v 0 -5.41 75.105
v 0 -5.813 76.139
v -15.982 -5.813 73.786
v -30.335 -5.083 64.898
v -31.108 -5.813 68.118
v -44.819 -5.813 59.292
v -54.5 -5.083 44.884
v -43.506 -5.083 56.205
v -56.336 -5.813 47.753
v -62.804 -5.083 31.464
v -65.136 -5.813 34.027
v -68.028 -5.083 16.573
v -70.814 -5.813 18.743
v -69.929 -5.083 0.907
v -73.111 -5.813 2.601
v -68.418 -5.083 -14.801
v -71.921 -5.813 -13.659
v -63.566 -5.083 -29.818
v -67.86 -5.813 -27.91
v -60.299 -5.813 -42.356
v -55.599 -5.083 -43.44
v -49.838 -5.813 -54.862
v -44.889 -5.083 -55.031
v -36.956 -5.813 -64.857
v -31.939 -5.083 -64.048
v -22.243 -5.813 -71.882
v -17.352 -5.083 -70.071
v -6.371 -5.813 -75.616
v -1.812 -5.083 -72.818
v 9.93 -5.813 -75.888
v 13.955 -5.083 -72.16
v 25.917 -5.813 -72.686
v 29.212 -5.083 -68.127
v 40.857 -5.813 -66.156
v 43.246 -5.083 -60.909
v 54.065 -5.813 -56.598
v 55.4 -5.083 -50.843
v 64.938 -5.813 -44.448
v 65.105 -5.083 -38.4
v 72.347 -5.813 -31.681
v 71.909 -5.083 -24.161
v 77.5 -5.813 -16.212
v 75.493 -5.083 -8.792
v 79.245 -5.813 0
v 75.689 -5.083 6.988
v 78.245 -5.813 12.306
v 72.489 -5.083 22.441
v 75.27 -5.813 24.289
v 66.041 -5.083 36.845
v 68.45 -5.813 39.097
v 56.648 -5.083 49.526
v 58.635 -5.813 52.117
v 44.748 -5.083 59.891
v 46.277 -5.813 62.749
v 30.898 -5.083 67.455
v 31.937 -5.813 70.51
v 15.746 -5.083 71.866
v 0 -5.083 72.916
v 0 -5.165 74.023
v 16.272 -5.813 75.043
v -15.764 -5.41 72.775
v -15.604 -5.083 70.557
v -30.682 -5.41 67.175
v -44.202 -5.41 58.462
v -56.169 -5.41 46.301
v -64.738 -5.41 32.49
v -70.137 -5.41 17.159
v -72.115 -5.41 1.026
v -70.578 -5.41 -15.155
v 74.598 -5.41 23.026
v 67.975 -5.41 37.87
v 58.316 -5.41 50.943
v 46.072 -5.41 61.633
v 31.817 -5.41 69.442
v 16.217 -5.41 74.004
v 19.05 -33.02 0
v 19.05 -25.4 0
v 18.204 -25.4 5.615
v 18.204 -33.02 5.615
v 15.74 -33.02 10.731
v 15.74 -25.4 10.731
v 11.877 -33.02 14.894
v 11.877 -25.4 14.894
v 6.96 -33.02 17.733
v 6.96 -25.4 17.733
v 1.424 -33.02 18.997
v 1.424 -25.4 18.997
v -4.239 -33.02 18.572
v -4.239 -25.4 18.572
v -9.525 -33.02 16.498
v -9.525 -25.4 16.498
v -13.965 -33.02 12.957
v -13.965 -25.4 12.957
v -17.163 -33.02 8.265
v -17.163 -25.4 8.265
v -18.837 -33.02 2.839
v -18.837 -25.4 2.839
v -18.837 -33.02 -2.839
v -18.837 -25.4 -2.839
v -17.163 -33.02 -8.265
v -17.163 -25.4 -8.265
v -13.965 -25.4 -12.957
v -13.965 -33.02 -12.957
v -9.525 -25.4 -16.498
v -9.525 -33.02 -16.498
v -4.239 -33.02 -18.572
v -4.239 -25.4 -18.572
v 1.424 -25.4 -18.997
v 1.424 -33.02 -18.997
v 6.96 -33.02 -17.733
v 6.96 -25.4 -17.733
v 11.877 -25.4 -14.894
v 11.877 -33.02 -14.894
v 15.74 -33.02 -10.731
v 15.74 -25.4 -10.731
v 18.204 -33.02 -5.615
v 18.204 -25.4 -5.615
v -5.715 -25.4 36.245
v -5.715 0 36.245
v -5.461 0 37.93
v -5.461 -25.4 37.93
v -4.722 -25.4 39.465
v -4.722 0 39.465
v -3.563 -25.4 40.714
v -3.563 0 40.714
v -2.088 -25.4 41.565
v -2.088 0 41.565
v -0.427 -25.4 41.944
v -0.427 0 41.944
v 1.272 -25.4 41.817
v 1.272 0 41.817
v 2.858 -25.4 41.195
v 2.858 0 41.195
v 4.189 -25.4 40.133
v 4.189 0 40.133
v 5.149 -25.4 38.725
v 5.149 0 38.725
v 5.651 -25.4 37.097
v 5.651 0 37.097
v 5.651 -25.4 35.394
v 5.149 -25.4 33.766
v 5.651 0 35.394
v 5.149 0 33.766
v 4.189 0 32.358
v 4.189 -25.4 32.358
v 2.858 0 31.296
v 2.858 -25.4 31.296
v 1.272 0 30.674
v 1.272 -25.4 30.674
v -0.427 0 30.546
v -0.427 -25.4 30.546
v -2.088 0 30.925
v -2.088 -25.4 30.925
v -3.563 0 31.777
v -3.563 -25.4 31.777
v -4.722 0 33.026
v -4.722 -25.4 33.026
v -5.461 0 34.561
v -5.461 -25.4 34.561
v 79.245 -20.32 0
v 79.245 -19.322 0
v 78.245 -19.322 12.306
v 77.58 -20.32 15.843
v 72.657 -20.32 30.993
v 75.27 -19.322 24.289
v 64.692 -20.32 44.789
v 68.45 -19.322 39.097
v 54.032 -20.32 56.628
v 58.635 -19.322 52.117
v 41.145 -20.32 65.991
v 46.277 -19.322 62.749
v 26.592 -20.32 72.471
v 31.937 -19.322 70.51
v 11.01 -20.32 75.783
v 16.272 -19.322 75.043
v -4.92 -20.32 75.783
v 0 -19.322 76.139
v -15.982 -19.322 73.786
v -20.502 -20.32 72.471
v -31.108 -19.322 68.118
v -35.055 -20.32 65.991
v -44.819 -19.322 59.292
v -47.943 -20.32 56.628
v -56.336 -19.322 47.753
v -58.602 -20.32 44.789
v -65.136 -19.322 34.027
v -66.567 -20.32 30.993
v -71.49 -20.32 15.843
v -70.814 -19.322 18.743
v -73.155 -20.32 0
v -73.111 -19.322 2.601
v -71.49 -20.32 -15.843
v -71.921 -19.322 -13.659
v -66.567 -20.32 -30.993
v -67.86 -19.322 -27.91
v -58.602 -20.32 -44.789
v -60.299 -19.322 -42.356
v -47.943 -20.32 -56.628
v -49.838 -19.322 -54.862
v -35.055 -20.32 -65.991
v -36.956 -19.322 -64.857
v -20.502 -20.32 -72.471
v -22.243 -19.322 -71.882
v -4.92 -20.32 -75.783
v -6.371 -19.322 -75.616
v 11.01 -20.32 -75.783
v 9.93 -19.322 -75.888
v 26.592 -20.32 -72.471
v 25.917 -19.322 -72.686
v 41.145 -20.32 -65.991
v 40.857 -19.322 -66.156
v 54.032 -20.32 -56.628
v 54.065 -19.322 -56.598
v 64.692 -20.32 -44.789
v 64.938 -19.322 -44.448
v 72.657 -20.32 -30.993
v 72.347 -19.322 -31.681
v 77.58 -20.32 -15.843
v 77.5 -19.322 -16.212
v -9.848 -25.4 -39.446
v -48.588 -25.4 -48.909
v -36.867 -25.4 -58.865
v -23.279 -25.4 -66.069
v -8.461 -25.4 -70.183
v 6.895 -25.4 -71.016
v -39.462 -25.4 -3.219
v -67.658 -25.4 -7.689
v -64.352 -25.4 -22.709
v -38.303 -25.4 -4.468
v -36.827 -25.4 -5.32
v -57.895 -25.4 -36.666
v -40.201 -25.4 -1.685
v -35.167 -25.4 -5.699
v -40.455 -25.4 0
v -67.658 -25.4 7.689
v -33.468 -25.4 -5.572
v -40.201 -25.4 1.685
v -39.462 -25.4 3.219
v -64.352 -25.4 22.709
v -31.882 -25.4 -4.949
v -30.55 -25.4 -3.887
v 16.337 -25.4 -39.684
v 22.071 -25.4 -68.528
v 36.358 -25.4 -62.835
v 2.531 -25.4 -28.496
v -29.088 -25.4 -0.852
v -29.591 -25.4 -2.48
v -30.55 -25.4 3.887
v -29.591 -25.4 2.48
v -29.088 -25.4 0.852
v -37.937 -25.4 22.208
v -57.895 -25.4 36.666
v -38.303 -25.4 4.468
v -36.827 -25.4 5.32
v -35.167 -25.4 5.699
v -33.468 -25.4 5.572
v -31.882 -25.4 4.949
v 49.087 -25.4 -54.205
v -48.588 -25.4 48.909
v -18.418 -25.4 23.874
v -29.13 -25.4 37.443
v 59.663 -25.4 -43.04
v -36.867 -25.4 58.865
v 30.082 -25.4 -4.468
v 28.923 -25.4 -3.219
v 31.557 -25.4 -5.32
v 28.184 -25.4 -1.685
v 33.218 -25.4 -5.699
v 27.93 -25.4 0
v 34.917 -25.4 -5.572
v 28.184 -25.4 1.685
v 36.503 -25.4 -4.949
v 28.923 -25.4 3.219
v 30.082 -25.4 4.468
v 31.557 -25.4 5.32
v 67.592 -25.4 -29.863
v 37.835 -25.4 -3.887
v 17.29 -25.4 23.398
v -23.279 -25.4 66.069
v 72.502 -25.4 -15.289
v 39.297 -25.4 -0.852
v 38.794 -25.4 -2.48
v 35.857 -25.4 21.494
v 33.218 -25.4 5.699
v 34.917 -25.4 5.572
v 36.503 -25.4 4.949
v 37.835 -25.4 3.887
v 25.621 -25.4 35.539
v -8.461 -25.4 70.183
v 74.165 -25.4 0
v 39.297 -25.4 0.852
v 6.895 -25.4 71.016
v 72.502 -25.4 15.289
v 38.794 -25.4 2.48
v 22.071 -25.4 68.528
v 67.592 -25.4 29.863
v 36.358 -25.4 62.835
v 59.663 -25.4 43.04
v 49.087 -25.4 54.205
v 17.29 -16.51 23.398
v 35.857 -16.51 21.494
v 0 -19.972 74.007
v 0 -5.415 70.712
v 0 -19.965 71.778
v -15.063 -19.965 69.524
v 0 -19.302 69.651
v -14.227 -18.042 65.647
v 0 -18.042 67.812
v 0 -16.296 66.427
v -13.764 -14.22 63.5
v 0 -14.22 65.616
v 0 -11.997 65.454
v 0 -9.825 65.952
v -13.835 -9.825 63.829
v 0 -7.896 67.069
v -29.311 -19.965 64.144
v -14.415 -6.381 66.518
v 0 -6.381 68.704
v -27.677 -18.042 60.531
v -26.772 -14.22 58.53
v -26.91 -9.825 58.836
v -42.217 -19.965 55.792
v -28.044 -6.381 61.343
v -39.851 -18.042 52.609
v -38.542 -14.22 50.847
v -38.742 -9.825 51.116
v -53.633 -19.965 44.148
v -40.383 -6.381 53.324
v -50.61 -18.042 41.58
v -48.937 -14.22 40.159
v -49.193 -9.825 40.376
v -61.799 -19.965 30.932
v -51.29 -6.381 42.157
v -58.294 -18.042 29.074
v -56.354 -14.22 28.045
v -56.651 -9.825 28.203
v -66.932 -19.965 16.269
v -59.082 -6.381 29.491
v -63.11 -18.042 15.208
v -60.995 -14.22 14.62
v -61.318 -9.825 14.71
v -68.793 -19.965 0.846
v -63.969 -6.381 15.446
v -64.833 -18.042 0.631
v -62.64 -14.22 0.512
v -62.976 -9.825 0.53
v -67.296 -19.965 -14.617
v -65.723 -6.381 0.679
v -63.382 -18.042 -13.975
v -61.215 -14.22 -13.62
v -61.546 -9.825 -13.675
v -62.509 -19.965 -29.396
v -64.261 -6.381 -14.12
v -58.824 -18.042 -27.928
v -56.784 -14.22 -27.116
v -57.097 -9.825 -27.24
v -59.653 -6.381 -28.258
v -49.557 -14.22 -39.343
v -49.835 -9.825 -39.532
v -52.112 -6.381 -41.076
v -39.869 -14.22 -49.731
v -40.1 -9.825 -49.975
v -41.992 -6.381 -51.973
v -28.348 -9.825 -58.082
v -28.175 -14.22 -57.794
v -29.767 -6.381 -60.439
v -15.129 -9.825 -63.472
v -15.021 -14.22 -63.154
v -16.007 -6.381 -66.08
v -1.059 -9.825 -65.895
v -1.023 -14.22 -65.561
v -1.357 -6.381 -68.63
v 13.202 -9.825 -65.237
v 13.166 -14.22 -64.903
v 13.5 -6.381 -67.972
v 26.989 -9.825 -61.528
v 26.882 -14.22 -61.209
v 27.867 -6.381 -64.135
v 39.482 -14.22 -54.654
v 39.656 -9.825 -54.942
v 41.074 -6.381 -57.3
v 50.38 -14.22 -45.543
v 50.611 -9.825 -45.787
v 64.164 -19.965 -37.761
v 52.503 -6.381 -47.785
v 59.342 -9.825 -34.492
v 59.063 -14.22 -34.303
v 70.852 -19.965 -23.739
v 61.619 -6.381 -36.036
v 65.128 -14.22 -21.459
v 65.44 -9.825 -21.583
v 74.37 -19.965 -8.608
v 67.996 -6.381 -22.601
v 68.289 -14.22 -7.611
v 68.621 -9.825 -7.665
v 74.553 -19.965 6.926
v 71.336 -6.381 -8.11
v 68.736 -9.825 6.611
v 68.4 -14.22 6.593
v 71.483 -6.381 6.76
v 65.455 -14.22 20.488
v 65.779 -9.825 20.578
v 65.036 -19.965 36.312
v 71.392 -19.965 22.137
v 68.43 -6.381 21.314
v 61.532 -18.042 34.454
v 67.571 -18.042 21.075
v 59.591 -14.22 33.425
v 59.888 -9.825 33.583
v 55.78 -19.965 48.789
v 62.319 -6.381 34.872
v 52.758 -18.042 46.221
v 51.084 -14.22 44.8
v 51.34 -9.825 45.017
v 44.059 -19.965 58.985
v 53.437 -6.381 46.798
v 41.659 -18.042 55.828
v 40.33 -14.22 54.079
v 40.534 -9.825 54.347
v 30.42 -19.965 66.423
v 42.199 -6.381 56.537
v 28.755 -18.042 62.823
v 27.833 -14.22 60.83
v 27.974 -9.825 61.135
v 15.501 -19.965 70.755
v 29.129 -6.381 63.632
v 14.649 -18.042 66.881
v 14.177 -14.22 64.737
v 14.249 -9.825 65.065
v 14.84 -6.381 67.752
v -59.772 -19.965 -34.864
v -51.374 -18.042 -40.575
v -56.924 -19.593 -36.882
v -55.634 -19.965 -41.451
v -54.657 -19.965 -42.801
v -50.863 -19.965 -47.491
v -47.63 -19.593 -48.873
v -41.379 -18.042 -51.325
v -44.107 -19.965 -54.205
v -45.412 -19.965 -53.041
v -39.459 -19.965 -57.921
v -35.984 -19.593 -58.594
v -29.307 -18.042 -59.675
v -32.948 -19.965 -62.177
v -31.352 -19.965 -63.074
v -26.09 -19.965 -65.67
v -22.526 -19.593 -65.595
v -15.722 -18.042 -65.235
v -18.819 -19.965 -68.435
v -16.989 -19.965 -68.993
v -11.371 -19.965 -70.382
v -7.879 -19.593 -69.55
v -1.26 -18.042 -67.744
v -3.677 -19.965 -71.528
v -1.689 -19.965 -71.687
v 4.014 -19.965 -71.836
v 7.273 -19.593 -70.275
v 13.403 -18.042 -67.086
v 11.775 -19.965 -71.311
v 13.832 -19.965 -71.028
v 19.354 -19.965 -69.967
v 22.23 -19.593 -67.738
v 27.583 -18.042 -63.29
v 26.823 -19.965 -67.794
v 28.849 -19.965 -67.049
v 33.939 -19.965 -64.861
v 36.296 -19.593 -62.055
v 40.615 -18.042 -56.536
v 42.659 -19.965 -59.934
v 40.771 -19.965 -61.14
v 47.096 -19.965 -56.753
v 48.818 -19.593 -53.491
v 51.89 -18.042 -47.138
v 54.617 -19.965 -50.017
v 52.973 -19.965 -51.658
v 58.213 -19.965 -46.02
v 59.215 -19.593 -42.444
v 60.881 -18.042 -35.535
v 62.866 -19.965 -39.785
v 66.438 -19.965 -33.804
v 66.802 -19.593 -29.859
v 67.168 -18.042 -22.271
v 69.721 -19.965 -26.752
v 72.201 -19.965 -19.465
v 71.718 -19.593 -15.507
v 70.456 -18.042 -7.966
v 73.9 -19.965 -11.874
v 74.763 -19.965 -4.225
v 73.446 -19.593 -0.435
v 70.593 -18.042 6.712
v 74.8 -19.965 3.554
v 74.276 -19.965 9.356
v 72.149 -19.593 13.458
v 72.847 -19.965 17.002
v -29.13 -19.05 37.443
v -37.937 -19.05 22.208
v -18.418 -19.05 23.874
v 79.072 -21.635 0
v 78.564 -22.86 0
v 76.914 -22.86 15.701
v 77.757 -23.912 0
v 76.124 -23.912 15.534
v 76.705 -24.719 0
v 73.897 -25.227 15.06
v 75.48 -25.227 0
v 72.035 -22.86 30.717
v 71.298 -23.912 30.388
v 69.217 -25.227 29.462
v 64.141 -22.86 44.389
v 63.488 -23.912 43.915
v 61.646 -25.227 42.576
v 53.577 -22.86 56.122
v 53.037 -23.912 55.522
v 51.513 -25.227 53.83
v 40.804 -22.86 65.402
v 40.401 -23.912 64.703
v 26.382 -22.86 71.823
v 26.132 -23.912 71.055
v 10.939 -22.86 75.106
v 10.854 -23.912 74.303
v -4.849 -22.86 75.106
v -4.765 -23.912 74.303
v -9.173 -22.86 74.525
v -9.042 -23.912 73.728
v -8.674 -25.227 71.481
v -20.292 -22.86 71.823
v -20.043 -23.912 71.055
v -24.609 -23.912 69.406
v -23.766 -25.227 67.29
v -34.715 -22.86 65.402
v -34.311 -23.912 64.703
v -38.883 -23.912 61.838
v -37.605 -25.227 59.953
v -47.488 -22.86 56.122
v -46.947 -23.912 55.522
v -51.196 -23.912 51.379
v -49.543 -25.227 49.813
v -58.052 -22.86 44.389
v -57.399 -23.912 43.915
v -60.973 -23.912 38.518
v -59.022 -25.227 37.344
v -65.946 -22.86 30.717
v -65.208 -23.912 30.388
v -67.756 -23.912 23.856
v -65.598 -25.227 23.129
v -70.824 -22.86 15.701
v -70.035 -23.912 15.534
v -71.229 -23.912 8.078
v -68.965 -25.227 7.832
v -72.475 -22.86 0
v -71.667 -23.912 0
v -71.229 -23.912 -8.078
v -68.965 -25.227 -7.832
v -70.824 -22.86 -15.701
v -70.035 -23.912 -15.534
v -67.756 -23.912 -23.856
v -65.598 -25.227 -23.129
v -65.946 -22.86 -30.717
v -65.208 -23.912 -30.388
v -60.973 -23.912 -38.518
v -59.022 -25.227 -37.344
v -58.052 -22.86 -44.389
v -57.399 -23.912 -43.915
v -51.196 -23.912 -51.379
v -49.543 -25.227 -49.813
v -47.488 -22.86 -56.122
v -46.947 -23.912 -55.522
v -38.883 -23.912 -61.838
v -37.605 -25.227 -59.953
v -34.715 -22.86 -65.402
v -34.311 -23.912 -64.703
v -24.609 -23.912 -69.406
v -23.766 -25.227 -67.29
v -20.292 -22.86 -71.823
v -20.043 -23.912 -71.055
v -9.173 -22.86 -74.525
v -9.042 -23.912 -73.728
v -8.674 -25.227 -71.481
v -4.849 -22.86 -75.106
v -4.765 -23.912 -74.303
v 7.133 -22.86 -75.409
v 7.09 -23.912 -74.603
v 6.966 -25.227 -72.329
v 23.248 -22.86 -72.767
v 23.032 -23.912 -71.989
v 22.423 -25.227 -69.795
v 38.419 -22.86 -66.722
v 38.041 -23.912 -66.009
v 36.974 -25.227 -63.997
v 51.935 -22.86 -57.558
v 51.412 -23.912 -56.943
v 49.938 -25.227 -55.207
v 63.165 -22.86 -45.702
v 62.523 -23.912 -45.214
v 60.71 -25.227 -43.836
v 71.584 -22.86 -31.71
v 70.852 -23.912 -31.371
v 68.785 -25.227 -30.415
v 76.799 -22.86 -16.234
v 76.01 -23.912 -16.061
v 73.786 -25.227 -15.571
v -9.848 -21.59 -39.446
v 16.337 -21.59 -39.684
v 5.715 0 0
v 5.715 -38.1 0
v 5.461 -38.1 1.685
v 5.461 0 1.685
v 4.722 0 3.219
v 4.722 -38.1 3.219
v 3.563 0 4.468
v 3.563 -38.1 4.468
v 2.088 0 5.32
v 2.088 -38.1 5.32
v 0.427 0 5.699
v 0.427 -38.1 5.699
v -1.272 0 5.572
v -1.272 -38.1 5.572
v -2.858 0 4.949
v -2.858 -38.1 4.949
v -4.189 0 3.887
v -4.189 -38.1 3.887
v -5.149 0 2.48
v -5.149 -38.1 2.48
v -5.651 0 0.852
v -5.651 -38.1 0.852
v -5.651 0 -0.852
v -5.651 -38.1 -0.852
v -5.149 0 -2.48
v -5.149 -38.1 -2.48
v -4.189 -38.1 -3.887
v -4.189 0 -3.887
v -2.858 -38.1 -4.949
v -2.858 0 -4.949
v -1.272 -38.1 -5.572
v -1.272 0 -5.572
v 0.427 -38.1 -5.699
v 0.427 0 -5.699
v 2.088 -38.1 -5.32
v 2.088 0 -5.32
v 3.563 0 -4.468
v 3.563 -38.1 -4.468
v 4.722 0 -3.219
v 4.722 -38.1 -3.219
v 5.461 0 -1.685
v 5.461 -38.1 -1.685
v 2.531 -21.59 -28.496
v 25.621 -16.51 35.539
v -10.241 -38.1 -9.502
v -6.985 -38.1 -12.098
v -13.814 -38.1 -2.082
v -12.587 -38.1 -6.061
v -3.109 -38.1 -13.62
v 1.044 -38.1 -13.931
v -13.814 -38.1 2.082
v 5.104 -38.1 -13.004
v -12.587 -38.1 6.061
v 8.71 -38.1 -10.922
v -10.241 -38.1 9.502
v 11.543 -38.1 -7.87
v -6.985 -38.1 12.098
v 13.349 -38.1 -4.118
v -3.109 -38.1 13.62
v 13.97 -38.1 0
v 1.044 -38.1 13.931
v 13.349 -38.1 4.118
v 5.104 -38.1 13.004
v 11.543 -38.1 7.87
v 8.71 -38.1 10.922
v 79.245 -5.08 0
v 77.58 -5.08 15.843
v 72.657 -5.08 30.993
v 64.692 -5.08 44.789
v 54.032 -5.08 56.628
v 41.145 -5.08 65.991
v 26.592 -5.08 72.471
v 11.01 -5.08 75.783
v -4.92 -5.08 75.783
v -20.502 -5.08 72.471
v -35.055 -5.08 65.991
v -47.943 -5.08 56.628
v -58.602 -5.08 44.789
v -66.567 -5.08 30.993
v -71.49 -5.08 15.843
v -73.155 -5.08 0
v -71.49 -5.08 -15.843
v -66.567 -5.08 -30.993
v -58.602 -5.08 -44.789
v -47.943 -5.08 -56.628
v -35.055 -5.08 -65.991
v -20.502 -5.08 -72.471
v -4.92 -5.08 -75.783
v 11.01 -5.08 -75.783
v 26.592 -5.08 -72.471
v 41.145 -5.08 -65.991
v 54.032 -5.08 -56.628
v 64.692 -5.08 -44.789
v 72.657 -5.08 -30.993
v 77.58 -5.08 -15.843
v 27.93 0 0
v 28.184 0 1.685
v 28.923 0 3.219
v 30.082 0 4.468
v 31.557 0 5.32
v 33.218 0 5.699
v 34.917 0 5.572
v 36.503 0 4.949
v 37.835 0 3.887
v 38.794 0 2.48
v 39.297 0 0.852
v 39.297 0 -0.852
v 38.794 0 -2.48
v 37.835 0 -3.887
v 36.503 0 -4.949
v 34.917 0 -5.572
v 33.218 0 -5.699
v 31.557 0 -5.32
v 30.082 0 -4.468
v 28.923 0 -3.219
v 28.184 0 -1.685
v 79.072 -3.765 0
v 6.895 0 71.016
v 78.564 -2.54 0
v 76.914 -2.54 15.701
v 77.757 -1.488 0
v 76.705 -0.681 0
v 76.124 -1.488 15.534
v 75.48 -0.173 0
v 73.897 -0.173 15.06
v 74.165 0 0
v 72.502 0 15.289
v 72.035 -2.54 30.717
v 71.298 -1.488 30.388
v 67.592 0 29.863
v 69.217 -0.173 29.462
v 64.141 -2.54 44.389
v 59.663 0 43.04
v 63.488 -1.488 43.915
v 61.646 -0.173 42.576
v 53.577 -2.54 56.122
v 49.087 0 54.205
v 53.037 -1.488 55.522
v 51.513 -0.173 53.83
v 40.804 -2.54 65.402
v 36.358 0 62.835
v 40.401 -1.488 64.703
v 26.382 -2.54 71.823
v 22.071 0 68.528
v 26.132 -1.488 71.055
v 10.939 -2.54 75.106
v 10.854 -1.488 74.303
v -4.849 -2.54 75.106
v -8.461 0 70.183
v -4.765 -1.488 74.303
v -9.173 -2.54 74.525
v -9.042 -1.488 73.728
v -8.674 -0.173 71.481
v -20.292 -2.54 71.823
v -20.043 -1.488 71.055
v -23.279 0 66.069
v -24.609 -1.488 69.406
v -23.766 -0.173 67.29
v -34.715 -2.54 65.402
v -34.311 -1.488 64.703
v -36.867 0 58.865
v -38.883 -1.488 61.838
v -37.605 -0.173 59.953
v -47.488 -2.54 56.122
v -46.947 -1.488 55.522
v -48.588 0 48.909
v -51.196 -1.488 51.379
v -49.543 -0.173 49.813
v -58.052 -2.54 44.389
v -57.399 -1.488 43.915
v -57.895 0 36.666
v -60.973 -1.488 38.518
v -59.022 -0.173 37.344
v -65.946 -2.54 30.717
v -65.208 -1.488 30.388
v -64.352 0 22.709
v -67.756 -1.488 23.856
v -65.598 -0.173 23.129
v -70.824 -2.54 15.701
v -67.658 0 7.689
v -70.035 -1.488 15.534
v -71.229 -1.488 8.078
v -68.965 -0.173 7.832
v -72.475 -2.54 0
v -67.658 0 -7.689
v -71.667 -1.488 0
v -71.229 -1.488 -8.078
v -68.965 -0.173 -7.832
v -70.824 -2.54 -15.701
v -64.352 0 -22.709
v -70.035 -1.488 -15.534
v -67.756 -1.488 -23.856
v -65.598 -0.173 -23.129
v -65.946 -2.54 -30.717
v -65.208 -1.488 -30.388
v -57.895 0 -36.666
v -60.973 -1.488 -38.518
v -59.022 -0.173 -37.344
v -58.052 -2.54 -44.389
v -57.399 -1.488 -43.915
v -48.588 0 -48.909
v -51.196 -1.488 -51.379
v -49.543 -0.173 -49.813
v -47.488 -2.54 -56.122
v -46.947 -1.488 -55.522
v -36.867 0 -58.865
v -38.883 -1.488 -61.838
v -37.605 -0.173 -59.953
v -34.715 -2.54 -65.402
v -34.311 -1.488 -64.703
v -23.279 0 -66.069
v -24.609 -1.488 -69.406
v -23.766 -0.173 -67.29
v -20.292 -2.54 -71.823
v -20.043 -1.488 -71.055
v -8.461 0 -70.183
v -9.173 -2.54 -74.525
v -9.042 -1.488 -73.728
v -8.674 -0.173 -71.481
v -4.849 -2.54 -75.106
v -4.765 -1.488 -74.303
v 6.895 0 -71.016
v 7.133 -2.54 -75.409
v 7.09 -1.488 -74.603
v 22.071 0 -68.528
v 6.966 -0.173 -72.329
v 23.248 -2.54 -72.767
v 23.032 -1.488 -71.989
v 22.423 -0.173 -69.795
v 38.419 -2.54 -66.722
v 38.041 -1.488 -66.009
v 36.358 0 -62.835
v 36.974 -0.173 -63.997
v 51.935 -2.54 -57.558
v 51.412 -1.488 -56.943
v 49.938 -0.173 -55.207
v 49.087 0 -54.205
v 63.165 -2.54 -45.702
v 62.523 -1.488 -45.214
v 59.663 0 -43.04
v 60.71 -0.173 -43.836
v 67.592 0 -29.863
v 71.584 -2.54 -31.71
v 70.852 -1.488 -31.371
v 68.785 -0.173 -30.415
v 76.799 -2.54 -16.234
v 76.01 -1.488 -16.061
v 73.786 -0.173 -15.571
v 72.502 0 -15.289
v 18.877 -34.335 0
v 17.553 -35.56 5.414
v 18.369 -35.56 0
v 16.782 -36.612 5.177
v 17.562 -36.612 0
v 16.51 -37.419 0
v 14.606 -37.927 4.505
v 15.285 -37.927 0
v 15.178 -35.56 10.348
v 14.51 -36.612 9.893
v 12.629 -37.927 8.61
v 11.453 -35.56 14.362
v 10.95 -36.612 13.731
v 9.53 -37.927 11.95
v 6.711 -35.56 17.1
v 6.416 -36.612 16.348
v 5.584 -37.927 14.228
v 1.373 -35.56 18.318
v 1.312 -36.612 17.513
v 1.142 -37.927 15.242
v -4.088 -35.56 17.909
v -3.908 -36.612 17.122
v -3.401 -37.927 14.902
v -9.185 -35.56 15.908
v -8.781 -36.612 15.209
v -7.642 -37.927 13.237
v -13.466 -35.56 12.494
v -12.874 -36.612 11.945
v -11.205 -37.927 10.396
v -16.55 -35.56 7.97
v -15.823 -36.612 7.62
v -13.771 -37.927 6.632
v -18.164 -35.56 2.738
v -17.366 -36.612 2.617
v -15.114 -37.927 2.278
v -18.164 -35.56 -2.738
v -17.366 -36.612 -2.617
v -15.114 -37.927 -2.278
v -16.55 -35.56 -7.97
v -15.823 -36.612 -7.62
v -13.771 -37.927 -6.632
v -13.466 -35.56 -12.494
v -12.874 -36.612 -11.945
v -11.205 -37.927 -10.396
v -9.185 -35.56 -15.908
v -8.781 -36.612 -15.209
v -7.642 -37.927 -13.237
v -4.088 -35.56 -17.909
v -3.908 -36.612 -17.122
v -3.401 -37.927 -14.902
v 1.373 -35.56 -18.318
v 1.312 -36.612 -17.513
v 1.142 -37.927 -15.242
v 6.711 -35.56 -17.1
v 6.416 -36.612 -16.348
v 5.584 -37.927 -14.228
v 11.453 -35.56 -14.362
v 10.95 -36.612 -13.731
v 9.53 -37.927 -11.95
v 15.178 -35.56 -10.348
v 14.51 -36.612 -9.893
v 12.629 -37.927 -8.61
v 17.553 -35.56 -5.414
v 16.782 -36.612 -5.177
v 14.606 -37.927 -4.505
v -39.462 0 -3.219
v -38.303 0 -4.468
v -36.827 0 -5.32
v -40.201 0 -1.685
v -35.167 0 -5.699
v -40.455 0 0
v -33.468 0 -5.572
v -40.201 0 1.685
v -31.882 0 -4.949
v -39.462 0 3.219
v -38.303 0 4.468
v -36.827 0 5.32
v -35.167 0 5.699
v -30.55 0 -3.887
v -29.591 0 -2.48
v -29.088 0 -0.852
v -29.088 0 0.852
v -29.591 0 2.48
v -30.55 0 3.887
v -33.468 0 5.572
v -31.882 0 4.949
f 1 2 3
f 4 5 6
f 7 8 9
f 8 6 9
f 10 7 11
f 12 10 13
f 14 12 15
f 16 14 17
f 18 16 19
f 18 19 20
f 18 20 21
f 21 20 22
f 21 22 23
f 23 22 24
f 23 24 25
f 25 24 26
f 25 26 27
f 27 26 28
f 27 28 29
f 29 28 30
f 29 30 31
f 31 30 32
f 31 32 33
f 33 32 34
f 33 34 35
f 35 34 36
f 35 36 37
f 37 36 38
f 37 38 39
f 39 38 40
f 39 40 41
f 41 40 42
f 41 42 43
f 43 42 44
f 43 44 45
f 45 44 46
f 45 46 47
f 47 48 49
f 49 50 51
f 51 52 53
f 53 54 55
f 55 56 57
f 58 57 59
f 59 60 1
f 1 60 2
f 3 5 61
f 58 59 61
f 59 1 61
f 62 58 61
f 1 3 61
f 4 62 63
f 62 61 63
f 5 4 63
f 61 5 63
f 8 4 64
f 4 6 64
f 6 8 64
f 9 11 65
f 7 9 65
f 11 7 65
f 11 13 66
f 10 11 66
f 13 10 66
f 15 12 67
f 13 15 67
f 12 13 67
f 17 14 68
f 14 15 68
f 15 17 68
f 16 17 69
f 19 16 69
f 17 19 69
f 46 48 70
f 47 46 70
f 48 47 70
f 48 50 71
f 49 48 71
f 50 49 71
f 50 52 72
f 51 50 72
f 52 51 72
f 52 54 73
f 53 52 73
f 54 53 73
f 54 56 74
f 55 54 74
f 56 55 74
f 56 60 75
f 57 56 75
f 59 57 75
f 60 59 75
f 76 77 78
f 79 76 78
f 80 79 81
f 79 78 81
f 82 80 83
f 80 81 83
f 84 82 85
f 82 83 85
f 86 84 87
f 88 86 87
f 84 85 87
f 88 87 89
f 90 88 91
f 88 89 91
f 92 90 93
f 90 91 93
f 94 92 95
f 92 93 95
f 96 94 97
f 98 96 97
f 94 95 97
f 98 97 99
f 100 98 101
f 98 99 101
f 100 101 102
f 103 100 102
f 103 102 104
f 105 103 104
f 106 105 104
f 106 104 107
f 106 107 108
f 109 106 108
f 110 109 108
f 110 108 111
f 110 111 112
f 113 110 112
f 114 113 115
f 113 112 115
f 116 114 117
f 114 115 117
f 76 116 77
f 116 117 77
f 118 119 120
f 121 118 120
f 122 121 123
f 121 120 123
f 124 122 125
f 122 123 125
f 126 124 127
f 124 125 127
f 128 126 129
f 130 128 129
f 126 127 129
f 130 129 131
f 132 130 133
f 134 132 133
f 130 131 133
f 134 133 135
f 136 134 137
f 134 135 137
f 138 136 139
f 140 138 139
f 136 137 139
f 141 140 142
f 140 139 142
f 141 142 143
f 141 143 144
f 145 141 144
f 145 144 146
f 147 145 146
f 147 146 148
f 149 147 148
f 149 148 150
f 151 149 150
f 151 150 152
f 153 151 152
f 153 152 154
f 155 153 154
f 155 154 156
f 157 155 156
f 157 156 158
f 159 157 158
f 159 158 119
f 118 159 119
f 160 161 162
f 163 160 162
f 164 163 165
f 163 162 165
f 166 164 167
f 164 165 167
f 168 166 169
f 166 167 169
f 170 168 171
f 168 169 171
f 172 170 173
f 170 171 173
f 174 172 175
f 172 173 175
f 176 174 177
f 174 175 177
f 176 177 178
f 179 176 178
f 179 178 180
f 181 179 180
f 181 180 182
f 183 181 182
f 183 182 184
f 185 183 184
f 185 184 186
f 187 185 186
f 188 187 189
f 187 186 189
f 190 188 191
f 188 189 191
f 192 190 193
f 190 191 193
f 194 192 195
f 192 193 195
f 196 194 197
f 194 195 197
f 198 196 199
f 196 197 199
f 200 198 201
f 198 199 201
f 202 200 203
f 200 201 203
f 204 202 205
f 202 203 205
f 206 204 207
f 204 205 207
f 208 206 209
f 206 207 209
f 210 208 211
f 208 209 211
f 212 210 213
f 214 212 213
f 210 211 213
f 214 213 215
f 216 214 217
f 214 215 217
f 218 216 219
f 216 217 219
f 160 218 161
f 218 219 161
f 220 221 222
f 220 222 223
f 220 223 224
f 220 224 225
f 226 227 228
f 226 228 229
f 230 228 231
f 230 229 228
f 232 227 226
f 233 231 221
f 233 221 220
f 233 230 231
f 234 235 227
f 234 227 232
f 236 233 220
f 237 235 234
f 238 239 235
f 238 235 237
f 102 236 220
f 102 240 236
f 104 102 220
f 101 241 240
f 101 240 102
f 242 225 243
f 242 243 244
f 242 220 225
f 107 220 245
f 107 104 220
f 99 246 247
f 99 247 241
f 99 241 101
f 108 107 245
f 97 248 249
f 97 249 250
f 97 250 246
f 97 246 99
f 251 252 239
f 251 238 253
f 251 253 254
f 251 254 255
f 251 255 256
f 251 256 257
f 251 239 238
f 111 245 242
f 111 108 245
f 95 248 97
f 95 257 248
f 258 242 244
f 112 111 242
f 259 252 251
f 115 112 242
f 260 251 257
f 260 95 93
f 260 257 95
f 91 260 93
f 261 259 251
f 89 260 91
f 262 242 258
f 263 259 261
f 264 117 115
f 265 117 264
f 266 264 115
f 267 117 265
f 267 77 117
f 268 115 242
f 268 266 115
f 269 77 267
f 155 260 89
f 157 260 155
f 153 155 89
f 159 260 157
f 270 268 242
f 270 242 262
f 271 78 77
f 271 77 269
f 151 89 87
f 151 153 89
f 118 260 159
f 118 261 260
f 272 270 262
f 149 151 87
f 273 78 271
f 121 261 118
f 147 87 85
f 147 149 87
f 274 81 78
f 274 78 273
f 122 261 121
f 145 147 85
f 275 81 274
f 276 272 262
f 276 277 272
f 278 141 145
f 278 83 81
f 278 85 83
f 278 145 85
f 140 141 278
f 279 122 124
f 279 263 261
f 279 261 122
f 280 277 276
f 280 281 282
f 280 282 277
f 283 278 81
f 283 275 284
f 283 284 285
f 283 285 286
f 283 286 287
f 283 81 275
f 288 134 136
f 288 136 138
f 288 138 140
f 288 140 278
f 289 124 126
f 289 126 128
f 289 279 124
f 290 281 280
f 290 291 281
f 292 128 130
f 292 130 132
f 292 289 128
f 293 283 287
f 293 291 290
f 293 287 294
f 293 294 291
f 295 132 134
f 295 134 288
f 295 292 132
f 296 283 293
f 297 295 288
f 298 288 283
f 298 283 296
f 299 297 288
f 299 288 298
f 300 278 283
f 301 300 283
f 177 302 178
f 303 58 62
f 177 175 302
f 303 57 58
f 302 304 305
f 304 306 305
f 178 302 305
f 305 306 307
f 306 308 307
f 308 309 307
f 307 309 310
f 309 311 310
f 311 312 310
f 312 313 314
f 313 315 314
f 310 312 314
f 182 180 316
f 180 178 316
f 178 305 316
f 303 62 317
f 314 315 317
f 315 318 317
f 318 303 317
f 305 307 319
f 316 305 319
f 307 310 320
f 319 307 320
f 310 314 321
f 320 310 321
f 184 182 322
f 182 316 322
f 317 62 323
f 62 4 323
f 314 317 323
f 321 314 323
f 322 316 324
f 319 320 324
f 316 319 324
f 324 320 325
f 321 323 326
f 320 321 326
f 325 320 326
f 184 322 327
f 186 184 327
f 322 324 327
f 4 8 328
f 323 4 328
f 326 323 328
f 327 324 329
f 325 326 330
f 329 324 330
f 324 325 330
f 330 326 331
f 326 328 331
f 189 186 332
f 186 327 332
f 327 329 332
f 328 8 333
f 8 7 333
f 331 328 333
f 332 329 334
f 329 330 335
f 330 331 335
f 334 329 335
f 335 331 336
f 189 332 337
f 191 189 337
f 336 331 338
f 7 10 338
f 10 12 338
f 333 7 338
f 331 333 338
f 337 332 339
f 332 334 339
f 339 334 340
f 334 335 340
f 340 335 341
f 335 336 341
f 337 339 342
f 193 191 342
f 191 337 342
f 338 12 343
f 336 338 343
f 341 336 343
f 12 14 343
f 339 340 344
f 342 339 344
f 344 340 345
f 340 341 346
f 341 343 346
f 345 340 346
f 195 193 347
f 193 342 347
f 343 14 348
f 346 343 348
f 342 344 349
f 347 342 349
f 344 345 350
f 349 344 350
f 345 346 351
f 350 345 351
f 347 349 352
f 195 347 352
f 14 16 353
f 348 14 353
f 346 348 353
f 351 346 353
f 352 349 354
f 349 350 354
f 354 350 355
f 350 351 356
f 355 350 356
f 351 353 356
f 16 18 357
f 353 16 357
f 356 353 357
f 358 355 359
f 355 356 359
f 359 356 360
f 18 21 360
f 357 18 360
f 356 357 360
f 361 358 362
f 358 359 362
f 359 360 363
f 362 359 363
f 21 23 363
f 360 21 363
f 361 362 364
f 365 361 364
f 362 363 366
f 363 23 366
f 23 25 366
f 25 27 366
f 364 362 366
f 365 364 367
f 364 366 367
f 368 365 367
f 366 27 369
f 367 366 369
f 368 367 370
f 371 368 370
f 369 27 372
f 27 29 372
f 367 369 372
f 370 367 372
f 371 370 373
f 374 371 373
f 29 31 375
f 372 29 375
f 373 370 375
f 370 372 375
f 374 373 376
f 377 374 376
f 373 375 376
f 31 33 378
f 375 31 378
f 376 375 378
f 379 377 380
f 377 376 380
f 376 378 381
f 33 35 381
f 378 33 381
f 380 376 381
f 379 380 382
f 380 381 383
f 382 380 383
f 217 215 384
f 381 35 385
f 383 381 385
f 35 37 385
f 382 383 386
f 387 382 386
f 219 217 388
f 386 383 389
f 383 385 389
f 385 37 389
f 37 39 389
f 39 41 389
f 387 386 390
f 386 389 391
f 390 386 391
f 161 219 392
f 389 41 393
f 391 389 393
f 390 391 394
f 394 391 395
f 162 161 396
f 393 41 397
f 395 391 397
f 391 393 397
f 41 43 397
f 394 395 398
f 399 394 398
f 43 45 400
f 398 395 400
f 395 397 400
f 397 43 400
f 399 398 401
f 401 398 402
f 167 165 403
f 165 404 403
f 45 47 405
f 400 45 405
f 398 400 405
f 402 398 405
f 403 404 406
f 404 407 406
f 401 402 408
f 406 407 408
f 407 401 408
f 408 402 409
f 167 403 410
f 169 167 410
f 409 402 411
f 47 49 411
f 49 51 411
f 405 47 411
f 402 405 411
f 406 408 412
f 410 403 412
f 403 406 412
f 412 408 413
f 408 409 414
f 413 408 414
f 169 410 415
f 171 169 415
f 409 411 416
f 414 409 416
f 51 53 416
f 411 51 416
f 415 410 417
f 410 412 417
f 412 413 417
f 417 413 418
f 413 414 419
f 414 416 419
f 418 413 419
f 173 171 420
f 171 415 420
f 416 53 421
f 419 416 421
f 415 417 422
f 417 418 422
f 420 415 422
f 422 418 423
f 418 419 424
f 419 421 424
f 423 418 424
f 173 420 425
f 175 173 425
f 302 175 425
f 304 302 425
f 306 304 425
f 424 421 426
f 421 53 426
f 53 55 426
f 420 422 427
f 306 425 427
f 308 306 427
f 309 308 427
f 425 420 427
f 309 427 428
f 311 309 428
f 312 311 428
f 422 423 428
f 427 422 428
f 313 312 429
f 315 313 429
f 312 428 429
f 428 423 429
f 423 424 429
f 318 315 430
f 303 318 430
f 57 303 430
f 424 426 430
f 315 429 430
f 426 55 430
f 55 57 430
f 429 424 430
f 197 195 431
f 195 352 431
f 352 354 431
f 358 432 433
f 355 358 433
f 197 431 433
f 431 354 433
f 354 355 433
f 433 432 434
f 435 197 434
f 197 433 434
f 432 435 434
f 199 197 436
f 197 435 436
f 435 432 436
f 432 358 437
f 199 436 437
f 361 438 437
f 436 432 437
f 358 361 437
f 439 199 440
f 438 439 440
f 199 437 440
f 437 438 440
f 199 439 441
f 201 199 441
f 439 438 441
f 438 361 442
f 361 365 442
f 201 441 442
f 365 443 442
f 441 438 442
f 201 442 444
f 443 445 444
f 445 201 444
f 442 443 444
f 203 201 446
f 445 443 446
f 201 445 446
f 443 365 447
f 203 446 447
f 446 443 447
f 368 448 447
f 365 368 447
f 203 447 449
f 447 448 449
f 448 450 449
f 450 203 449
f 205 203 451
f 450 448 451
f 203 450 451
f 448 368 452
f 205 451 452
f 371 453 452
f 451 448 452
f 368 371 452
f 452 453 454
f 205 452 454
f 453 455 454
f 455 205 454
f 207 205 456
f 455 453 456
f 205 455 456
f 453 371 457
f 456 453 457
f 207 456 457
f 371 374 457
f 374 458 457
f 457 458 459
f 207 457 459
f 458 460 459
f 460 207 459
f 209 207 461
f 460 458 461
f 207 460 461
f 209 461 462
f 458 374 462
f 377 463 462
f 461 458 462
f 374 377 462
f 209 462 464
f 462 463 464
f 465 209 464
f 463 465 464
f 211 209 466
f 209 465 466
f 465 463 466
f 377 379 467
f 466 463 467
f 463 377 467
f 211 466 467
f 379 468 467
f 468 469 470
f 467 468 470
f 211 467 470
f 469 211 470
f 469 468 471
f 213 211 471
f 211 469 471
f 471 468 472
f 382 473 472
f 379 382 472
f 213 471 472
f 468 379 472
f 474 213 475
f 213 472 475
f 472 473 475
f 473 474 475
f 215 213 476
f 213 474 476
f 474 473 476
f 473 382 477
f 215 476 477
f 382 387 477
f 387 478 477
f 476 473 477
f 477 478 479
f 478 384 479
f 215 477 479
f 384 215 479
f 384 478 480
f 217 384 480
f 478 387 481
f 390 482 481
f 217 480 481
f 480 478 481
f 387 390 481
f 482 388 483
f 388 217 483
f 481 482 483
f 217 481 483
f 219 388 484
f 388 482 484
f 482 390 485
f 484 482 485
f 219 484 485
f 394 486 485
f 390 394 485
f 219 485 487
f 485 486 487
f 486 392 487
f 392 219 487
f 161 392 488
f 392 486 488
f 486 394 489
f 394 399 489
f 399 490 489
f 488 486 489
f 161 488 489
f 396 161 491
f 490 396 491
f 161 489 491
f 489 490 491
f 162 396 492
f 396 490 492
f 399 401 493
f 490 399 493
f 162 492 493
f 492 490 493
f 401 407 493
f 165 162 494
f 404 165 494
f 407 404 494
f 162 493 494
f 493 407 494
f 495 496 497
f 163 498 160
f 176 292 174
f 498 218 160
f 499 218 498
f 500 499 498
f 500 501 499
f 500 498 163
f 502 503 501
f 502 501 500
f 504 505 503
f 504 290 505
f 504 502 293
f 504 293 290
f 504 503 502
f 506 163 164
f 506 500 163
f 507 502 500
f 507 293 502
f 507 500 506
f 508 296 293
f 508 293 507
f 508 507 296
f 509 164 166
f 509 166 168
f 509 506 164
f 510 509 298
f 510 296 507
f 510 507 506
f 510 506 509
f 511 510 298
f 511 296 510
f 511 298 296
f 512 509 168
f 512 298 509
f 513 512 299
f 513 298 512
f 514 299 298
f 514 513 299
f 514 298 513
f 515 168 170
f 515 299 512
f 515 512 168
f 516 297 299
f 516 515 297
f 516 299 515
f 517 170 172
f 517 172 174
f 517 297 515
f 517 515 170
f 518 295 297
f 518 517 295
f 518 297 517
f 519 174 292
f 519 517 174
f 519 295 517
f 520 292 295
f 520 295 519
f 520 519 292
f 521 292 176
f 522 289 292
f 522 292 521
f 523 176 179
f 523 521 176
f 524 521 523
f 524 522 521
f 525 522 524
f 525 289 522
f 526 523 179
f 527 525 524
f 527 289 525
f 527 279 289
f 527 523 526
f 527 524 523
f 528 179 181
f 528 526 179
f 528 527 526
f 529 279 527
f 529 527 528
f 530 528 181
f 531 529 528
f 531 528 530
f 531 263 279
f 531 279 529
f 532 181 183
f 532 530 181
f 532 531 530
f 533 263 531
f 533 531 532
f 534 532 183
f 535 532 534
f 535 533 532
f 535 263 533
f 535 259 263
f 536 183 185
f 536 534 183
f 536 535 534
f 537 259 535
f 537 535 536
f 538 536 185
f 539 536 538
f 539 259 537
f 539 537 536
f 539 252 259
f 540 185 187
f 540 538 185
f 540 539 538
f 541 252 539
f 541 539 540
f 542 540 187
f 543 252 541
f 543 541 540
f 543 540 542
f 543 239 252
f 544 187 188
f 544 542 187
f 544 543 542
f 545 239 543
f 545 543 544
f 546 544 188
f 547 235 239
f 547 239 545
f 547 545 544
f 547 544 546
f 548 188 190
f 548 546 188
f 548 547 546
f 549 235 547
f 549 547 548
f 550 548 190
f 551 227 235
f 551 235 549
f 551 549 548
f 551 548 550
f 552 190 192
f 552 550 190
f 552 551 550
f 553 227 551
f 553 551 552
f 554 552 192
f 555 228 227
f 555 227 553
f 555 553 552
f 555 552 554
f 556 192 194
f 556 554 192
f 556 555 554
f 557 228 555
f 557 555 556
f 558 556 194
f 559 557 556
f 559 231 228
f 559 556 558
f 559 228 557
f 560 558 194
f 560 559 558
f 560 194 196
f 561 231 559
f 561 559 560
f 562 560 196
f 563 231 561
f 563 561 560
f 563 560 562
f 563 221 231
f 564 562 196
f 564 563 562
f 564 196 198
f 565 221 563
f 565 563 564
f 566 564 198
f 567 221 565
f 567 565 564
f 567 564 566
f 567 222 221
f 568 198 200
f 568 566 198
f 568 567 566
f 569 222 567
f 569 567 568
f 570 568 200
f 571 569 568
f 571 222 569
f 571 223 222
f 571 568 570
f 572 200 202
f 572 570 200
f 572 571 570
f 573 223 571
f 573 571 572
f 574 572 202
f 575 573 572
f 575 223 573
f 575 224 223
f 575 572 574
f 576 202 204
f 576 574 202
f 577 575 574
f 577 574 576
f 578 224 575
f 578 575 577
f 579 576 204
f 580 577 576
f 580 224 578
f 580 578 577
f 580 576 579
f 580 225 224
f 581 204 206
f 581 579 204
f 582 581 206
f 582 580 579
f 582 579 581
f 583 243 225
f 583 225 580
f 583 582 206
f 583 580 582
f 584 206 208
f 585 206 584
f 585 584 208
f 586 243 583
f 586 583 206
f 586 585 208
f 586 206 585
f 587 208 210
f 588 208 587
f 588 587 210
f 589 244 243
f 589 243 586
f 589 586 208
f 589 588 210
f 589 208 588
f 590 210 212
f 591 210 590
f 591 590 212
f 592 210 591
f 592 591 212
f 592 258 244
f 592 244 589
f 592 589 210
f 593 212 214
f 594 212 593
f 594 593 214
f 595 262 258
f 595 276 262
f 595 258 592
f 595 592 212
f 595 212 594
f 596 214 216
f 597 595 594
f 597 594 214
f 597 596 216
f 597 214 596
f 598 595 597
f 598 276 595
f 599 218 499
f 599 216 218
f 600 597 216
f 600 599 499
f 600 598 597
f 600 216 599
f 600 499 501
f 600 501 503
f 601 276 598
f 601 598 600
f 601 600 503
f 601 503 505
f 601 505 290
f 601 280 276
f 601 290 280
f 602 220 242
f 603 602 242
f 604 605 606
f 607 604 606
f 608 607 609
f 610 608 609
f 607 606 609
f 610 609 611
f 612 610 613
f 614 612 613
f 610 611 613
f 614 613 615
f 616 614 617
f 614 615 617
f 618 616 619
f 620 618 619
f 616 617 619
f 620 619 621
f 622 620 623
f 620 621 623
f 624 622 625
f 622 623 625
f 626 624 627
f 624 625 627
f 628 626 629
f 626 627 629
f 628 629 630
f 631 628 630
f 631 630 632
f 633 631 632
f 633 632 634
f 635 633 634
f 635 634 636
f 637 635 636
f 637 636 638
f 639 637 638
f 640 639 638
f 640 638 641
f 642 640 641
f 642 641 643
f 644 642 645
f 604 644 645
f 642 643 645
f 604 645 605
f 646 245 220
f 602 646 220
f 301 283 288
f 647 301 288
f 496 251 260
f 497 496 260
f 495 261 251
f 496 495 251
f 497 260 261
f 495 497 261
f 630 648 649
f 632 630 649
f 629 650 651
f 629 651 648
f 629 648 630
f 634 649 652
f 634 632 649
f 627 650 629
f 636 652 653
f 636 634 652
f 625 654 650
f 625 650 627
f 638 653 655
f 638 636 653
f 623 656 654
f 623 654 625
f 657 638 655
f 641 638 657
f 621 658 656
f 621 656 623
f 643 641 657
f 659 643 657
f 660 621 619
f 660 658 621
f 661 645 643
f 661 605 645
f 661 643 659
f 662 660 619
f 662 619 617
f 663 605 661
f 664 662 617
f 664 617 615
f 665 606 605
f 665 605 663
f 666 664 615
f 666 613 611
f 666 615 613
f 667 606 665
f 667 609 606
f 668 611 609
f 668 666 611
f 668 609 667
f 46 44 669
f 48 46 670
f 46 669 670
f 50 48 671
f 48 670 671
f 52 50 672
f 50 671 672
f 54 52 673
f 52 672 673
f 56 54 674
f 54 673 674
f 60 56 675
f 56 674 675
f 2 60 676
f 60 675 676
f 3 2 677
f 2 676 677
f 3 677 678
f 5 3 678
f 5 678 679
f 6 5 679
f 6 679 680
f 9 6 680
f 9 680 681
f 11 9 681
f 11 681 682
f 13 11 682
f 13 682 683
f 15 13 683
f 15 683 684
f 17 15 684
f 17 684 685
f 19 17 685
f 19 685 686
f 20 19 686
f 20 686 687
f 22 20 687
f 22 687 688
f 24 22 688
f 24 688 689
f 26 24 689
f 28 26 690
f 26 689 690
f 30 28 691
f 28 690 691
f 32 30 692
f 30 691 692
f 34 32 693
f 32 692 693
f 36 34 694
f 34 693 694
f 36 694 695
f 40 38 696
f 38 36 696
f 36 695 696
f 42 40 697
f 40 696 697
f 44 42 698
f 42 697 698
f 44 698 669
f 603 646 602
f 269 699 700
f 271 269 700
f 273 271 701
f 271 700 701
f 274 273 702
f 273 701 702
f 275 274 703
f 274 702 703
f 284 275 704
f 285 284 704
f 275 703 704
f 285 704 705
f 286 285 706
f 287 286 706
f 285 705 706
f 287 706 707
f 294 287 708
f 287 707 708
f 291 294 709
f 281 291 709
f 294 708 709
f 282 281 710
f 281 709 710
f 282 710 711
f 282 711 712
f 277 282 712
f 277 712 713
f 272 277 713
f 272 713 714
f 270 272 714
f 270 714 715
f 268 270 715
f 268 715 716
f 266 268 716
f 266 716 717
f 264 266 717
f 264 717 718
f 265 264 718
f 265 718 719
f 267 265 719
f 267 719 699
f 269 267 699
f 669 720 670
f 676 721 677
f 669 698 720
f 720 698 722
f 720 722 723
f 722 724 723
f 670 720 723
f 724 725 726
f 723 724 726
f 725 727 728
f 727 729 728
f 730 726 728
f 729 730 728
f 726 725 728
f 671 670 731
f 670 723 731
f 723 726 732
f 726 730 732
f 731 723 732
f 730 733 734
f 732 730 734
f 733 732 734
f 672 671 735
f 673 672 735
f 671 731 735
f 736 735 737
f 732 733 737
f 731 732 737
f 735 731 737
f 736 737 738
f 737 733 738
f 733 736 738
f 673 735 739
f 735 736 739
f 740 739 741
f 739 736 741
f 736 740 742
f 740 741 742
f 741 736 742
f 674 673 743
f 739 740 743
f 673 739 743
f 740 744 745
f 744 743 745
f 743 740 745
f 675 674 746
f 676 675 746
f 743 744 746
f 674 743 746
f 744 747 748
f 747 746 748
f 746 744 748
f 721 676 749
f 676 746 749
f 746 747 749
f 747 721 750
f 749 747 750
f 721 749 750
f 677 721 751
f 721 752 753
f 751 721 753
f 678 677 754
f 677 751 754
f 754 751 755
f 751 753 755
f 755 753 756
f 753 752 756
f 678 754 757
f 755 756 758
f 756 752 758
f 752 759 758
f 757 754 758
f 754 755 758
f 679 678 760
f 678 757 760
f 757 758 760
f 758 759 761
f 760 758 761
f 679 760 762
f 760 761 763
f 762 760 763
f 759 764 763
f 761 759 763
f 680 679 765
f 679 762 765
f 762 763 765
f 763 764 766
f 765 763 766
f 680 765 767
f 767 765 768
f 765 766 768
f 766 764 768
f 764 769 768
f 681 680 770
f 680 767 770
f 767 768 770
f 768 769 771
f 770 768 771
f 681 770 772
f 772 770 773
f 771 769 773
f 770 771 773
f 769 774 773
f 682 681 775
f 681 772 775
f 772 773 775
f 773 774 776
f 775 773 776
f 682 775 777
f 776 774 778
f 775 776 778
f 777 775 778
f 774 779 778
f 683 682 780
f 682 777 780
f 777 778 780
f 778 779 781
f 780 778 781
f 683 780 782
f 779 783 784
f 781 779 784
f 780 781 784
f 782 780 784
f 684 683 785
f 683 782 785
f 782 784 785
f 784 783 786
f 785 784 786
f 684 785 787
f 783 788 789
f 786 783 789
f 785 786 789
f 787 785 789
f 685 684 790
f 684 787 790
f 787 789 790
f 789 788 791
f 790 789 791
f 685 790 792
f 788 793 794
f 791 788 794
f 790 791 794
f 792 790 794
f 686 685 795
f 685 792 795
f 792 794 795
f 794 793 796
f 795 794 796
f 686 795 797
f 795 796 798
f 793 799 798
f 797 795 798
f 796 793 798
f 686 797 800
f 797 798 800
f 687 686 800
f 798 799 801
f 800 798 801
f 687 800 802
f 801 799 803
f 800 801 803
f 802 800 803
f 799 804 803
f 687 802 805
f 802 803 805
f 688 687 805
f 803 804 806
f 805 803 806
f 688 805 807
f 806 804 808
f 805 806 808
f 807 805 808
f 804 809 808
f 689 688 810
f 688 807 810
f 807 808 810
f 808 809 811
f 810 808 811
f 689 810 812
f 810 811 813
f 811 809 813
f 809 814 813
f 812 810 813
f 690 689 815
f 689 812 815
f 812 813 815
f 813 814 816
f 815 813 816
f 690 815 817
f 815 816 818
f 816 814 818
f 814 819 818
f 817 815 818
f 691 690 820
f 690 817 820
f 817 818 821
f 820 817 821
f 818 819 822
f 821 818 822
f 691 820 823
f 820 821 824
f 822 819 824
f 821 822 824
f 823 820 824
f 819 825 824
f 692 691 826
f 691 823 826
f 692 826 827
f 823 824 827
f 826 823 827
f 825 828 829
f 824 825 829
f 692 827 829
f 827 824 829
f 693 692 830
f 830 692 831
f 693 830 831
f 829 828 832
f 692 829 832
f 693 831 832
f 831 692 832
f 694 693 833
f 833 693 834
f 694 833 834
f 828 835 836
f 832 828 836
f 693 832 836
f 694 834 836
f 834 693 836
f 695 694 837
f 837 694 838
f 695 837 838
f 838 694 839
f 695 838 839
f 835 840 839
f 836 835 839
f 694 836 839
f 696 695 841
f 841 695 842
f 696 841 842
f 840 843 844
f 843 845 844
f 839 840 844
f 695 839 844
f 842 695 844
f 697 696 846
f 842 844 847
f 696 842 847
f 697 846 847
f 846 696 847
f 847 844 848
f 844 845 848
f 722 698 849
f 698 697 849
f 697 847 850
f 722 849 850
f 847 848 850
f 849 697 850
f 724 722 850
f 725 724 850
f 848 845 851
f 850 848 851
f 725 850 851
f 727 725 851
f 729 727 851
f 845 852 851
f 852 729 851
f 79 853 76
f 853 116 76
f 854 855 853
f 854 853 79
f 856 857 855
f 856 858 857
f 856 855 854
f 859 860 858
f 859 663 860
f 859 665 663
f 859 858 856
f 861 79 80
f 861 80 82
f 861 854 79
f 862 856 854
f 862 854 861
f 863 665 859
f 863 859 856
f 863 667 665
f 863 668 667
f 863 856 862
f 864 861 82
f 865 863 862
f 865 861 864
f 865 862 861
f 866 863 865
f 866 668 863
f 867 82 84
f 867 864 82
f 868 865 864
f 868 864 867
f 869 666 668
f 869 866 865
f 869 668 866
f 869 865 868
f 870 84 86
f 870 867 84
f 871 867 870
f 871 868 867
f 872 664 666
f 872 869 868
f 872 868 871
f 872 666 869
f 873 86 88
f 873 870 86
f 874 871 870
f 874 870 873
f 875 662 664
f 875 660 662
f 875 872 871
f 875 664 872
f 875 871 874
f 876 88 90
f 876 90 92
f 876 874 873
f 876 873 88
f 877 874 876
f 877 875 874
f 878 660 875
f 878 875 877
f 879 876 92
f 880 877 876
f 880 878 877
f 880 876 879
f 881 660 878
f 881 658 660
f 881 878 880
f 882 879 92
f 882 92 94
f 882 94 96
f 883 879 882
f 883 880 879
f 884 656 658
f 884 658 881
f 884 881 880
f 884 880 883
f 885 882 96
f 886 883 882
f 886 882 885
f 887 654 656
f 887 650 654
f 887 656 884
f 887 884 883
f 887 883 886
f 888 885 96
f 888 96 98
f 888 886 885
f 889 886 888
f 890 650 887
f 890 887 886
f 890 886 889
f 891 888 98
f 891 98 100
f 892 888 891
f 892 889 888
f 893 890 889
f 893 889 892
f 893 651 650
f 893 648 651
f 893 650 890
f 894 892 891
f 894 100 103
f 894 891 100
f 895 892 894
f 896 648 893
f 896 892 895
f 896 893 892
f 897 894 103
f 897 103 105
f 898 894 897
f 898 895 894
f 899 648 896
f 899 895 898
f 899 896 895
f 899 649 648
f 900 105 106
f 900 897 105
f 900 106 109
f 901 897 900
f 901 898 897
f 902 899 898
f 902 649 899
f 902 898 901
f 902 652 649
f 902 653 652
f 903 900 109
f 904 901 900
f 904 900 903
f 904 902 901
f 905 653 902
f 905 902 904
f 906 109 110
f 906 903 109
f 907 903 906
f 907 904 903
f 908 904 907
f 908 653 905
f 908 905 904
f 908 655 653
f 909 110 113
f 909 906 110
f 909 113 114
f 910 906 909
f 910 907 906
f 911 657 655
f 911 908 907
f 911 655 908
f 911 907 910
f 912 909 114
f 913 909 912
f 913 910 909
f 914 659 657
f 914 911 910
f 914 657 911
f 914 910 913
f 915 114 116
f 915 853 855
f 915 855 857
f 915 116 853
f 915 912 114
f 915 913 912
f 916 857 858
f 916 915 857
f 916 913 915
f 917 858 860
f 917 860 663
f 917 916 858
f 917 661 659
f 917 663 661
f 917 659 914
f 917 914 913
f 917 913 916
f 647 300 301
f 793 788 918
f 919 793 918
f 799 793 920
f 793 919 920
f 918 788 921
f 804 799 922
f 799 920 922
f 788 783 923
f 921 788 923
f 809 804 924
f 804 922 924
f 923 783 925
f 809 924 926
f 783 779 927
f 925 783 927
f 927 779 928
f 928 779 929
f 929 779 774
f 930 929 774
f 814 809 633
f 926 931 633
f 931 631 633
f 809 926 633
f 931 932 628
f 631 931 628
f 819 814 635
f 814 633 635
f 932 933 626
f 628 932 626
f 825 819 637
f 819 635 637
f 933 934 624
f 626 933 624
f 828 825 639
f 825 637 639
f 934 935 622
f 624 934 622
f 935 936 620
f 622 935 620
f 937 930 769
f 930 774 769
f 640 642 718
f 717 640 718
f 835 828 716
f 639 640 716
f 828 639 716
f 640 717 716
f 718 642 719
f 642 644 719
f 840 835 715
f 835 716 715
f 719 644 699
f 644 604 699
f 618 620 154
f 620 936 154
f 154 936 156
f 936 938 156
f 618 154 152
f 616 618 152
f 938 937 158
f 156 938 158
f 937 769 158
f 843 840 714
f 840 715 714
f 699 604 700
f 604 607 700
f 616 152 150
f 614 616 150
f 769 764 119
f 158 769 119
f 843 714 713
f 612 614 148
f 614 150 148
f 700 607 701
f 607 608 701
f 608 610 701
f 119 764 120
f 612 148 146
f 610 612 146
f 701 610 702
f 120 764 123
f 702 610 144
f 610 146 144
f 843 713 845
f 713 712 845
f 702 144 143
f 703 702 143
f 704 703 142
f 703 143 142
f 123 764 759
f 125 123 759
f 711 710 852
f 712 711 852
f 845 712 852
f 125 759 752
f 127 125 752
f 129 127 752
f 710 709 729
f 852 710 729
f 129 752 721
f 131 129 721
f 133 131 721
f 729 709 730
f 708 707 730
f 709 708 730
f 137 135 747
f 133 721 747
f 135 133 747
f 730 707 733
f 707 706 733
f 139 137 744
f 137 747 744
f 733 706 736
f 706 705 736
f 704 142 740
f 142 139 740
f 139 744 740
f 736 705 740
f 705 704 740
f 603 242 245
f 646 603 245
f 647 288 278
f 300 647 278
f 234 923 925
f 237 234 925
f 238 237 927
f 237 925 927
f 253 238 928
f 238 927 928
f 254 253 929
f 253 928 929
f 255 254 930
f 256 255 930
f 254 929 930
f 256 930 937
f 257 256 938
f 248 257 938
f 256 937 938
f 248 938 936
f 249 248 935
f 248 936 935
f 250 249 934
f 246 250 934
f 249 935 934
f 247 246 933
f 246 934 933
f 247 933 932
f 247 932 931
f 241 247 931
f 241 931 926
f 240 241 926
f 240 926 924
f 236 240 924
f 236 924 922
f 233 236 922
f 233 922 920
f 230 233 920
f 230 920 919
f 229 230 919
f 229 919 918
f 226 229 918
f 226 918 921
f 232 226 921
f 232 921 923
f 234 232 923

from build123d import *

# Parameters (mm, degrees)
F0_R      = 76.2
F1_DEPTH  = 25.4
F2_R      = 19.05
F3_DEPTH  = 12.7
F4_R      = 5.08
F5_R      = 7.4843991105
F8_R      = 5.08
F9_R      = 5.715
F10_DEPTH = 38.1
F12_D     = 11.43
F15_D     = 11.43
F16_D     = 11.43
F18_DEPTH = 6.35
F20_DEPTH = 8.89
F22_DEPTH = 3.81


with BuildPart() as f1:
    # F0 (on Front) → F1 (new body)
    with BuildSketch(Plane.XZ):
        with Locations((3.0447455747, 0)):
            Circle(F0_R)
    extrude(amount=F1_DEPTH)

    # F2 (on face) → F3 (join)
    with BuildSketch(Plane.XZ.offset(25.4)):
        Circle(F2_R)
    extrude(amount=F3_DEPTH)

    # F4
    f4_edges = [f1.edges().sort_by_distance(p)[0] for p in [
        (79.244746, -12.7, 0),
        (-73.155254, 0, 0),
        (-73.155254, -25.4, 0),
    ]]
    fillet(f4_edges, radius=F4_R)

    # F5 (on Right) → F6 (revolve, cut)
    with BuildSketch(Plane.YZ):
        with Locations((-12.5674738179, 72.9161991943)):
            Circle(F5_R)
    revolve(axis=Axis((3.0447455747, 0, 0), (0, -1, 0)), mode=Mode.SUBTRACT)

    # F8
    f8_edges = [f1.edges().sort_by_distance(p)[0] for p in [
        (-19.05, -38.1, 0),
    ]]
    fillet(f8_edges, radius=F8_R)

    # F9 (on face) → F10 (cut)
    with BuildSketch(Plane.XZ.offset(38.1)):
        Circle(F9_R)
    extrude(amount=-F10_DEPTH, mode=Mode.SUBTRACT)

    # F12 (through all)
    with Locations(Plane.XZ.offset(25.4)):
        with Locations((0, 36.245391153)):
            Hole(F12_D / 2)

    # F15 (through all)
    with Locations(Plane.XZ.offset(25.4)):
        with Locations((-34.7395679537, 0)):
            Hole(F15_D / 2)

    # F16 (through all)
    with Locations(Plane.XZ.offset(25.4)):
        with Locations((33.6454086633, 0)):
            Hole(F16_D / 2)

    # F17 (on face) → F18 (cut)
    with BuildSketch(Plane.XZ.offset(25.4)):
        Polygon((-29.1296672076, 37.4430716038), (-37.9374213517, 22.2080387175), (-18.4175334871, 23.8743703812), align=None)
    extrude(amount=-F18_DEPTH, mode=Mode.SUBTRACT)

    # F19 (on face) → F20 (cut)
    with BuildSketch(Plane.XZ.offset(25.4)):
        Polygon((25.6212372333, 35.5386920273), (17.2895789146, 23.3982745558), (35.8572751284, 21.4938949794), align=None)
    extrude(amount=-F20_DEPTH, mode=Mode.SUBTRACT)

    # F21 (on face) → F22 (cut)
    with BuildSketch(Plane.XZ.offset(25.4)):
        Polygon((2.5306392927, -28.4960605204), (-9.8478263244, -39.4462421536), (16.3373891264, -39.6842882037), align=None)
    extrude(amount=-F22_DEPTH, mode=Mode.SUBTRACT)


solid = f1.part
